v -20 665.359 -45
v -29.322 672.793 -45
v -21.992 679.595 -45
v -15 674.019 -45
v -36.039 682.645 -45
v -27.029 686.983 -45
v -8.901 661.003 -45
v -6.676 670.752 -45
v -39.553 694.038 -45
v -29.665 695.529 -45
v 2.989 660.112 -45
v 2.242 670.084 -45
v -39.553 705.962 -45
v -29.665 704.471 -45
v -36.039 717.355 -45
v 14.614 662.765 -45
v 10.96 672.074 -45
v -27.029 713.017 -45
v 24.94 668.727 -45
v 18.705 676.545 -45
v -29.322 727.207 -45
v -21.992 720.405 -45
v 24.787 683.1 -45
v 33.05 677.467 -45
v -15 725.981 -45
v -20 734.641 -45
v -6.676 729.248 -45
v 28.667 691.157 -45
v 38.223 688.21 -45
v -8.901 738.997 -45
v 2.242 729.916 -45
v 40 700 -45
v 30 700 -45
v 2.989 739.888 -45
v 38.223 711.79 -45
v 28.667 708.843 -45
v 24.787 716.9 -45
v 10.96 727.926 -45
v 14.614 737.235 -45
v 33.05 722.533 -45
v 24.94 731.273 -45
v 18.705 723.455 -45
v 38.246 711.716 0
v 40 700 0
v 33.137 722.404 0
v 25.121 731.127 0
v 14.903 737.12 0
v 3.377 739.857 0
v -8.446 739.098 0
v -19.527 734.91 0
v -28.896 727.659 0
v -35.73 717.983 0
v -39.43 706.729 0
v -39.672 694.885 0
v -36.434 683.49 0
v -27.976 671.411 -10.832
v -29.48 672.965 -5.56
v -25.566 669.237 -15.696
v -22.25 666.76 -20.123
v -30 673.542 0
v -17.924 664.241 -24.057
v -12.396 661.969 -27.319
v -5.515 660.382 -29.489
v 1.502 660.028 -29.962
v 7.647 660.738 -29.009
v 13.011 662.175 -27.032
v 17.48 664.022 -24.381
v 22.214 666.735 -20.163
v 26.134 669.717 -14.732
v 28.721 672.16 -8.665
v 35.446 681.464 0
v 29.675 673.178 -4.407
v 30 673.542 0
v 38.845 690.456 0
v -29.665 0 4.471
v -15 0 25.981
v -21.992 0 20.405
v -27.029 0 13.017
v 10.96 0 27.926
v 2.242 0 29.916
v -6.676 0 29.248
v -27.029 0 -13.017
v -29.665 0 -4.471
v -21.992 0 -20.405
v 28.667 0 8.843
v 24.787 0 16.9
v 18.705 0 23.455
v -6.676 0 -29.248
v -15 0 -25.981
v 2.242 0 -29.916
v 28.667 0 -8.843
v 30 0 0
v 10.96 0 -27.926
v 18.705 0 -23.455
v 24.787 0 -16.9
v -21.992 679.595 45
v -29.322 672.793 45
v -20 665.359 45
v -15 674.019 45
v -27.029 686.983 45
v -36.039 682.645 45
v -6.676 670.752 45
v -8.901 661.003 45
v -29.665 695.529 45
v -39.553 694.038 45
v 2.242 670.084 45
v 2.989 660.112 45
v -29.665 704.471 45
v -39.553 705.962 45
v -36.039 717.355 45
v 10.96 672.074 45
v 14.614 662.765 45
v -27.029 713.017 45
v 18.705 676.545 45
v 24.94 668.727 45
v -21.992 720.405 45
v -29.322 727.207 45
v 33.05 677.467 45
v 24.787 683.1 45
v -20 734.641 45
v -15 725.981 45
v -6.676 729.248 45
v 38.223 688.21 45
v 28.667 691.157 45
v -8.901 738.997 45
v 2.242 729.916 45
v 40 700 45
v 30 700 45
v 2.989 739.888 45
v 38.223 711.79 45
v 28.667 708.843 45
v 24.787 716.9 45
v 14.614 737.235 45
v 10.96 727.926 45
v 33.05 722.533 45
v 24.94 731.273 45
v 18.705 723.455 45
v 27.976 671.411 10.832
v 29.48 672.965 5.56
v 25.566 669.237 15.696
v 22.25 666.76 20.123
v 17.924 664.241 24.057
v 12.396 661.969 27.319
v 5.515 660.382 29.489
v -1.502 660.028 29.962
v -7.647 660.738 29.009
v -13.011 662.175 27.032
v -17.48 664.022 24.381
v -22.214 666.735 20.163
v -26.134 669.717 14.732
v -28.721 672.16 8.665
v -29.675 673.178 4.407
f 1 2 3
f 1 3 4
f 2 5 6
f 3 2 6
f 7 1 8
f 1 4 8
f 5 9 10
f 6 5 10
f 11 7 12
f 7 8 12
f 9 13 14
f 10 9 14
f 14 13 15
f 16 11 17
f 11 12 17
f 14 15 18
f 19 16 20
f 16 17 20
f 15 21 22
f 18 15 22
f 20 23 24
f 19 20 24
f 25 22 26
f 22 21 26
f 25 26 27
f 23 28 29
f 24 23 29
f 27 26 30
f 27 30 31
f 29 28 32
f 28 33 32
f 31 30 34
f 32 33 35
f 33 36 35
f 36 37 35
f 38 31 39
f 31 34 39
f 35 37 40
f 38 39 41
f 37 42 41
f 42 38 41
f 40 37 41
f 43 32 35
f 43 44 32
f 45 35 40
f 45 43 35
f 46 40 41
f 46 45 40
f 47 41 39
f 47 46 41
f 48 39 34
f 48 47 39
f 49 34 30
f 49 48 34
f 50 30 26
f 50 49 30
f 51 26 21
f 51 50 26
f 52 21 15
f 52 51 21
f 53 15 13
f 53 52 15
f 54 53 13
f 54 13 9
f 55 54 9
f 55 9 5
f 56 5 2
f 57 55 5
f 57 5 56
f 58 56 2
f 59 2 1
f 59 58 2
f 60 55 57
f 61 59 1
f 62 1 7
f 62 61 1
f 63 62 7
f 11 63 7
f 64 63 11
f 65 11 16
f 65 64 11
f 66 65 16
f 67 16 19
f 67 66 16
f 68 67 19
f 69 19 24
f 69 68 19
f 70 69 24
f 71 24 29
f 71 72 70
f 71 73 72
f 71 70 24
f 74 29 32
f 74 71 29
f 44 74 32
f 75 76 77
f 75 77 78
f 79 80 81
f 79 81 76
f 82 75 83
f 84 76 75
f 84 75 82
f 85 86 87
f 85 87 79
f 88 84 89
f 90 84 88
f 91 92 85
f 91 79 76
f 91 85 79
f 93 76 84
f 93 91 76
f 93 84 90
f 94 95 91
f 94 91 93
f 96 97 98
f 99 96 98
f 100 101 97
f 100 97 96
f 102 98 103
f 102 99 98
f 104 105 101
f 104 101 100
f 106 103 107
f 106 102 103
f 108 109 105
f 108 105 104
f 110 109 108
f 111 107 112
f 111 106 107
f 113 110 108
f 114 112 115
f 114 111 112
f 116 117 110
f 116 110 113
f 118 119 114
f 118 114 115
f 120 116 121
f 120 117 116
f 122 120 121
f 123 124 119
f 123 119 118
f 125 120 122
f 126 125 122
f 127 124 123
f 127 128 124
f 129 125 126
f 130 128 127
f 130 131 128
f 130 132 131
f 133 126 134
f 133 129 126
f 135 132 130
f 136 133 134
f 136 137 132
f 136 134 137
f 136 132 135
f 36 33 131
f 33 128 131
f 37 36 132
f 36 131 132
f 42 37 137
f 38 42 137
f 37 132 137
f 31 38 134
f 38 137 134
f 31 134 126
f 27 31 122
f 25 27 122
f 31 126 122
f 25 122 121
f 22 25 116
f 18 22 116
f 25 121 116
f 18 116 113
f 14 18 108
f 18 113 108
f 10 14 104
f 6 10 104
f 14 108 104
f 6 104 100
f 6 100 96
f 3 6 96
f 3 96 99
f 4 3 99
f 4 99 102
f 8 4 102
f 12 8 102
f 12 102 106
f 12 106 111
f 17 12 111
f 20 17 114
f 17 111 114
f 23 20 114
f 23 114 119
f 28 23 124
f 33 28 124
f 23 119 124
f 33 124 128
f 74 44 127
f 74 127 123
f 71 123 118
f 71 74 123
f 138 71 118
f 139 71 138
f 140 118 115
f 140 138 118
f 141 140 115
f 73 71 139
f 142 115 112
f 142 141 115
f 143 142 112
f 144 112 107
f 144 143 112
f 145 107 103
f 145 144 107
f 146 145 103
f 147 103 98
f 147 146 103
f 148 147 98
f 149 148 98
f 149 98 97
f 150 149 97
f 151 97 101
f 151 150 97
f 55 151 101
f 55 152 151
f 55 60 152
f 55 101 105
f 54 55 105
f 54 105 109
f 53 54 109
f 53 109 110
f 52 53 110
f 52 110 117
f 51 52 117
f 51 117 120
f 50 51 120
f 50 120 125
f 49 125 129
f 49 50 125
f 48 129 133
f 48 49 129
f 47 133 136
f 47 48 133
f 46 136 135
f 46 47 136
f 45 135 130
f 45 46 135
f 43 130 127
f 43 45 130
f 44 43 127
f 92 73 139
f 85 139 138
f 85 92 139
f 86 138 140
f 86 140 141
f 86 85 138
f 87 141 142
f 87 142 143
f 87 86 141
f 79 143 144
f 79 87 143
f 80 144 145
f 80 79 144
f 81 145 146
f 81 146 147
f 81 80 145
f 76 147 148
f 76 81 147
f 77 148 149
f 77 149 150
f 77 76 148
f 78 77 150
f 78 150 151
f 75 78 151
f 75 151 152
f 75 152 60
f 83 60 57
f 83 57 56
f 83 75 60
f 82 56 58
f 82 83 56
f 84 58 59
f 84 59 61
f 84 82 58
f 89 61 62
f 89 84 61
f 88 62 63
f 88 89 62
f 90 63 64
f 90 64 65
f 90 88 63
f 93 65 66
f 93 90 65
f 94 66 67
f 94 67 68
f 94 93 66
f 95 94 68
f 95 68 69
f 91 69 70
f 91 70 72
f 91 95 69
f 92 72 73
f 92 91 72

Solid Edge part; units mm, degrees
sketch "Sketch1" plane through (0, 0, 0) normal (0, -1, 0) x (1, 0, 0)
  circle A0 centre (0, 0) radius 30
  dimension "D1" = 60
extrude "ExtrudedProtrusion_1" add sketch "Sketch1" against normal blind 700
sketch "Sketch2" plane through (0, 0, 0) normal (0, 0, 1) x (1, 0, 0)
  circle A0 centre (0, 700) radius 40
extrude "Protrusion1" add sketch "Sketch2" along normal mid plane 90
sketch "Sketch3" plane through (0, 528, 45) normal (0, 0, 1) x (1, 0, 0)
  circle A0 centre (0, 172) radius 30
extrude "Cutout1" cut sketch "Sketch3" against normal through all
